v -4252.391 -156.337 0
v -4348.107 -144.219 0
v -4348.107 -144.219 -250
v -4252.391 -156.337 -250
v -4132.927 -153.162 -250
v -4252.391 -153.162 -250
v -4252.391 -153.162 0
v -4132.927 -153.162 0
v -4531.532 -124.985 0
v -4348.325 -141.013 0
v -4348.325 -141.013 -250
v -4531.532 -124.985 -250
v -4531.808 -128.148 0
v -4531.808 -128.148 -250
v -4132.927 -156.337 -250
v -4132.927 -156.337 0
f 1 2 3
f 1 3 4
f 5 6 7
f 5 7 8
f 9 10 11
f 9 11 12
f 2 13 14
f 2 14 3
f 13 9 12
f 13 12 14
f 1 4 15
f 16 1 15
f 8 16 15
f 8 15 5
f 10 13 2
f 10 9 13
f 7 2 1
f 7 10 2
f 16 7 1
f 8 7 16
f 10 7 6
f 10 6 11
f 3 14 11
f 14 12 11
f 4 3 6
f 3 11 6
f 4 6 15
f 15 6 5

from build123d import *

# Parameters (mm, degrees)
SKETCH1_W           = 119.46432313
SKETCH1_H           = 3.175
BOSS_EXTRUDE1_DEPTH = 250


with BuildPart() as part:
    # Sketch1 → Boss-Extrude1 (new body)
    with BuildSketch(Plane.XY):
        Polygon((-4531.808395064, -128.147603784), (-4348.106631906, -144.21942553), (-4252.390993124, -156.337240533), (-4252.390993124, -153.162240533), (-4348.324803087, -141.01321004), (-4531.531675581, -124.984685617), align=None)
        with Locations((-4192.658831559, -154.749740533)):
            Rectangle(SKETCH1_W, SKETCH1_H)
    extrude(amount=-BOSS_EXTRUDE1_DEPTH)


solid = part.part
